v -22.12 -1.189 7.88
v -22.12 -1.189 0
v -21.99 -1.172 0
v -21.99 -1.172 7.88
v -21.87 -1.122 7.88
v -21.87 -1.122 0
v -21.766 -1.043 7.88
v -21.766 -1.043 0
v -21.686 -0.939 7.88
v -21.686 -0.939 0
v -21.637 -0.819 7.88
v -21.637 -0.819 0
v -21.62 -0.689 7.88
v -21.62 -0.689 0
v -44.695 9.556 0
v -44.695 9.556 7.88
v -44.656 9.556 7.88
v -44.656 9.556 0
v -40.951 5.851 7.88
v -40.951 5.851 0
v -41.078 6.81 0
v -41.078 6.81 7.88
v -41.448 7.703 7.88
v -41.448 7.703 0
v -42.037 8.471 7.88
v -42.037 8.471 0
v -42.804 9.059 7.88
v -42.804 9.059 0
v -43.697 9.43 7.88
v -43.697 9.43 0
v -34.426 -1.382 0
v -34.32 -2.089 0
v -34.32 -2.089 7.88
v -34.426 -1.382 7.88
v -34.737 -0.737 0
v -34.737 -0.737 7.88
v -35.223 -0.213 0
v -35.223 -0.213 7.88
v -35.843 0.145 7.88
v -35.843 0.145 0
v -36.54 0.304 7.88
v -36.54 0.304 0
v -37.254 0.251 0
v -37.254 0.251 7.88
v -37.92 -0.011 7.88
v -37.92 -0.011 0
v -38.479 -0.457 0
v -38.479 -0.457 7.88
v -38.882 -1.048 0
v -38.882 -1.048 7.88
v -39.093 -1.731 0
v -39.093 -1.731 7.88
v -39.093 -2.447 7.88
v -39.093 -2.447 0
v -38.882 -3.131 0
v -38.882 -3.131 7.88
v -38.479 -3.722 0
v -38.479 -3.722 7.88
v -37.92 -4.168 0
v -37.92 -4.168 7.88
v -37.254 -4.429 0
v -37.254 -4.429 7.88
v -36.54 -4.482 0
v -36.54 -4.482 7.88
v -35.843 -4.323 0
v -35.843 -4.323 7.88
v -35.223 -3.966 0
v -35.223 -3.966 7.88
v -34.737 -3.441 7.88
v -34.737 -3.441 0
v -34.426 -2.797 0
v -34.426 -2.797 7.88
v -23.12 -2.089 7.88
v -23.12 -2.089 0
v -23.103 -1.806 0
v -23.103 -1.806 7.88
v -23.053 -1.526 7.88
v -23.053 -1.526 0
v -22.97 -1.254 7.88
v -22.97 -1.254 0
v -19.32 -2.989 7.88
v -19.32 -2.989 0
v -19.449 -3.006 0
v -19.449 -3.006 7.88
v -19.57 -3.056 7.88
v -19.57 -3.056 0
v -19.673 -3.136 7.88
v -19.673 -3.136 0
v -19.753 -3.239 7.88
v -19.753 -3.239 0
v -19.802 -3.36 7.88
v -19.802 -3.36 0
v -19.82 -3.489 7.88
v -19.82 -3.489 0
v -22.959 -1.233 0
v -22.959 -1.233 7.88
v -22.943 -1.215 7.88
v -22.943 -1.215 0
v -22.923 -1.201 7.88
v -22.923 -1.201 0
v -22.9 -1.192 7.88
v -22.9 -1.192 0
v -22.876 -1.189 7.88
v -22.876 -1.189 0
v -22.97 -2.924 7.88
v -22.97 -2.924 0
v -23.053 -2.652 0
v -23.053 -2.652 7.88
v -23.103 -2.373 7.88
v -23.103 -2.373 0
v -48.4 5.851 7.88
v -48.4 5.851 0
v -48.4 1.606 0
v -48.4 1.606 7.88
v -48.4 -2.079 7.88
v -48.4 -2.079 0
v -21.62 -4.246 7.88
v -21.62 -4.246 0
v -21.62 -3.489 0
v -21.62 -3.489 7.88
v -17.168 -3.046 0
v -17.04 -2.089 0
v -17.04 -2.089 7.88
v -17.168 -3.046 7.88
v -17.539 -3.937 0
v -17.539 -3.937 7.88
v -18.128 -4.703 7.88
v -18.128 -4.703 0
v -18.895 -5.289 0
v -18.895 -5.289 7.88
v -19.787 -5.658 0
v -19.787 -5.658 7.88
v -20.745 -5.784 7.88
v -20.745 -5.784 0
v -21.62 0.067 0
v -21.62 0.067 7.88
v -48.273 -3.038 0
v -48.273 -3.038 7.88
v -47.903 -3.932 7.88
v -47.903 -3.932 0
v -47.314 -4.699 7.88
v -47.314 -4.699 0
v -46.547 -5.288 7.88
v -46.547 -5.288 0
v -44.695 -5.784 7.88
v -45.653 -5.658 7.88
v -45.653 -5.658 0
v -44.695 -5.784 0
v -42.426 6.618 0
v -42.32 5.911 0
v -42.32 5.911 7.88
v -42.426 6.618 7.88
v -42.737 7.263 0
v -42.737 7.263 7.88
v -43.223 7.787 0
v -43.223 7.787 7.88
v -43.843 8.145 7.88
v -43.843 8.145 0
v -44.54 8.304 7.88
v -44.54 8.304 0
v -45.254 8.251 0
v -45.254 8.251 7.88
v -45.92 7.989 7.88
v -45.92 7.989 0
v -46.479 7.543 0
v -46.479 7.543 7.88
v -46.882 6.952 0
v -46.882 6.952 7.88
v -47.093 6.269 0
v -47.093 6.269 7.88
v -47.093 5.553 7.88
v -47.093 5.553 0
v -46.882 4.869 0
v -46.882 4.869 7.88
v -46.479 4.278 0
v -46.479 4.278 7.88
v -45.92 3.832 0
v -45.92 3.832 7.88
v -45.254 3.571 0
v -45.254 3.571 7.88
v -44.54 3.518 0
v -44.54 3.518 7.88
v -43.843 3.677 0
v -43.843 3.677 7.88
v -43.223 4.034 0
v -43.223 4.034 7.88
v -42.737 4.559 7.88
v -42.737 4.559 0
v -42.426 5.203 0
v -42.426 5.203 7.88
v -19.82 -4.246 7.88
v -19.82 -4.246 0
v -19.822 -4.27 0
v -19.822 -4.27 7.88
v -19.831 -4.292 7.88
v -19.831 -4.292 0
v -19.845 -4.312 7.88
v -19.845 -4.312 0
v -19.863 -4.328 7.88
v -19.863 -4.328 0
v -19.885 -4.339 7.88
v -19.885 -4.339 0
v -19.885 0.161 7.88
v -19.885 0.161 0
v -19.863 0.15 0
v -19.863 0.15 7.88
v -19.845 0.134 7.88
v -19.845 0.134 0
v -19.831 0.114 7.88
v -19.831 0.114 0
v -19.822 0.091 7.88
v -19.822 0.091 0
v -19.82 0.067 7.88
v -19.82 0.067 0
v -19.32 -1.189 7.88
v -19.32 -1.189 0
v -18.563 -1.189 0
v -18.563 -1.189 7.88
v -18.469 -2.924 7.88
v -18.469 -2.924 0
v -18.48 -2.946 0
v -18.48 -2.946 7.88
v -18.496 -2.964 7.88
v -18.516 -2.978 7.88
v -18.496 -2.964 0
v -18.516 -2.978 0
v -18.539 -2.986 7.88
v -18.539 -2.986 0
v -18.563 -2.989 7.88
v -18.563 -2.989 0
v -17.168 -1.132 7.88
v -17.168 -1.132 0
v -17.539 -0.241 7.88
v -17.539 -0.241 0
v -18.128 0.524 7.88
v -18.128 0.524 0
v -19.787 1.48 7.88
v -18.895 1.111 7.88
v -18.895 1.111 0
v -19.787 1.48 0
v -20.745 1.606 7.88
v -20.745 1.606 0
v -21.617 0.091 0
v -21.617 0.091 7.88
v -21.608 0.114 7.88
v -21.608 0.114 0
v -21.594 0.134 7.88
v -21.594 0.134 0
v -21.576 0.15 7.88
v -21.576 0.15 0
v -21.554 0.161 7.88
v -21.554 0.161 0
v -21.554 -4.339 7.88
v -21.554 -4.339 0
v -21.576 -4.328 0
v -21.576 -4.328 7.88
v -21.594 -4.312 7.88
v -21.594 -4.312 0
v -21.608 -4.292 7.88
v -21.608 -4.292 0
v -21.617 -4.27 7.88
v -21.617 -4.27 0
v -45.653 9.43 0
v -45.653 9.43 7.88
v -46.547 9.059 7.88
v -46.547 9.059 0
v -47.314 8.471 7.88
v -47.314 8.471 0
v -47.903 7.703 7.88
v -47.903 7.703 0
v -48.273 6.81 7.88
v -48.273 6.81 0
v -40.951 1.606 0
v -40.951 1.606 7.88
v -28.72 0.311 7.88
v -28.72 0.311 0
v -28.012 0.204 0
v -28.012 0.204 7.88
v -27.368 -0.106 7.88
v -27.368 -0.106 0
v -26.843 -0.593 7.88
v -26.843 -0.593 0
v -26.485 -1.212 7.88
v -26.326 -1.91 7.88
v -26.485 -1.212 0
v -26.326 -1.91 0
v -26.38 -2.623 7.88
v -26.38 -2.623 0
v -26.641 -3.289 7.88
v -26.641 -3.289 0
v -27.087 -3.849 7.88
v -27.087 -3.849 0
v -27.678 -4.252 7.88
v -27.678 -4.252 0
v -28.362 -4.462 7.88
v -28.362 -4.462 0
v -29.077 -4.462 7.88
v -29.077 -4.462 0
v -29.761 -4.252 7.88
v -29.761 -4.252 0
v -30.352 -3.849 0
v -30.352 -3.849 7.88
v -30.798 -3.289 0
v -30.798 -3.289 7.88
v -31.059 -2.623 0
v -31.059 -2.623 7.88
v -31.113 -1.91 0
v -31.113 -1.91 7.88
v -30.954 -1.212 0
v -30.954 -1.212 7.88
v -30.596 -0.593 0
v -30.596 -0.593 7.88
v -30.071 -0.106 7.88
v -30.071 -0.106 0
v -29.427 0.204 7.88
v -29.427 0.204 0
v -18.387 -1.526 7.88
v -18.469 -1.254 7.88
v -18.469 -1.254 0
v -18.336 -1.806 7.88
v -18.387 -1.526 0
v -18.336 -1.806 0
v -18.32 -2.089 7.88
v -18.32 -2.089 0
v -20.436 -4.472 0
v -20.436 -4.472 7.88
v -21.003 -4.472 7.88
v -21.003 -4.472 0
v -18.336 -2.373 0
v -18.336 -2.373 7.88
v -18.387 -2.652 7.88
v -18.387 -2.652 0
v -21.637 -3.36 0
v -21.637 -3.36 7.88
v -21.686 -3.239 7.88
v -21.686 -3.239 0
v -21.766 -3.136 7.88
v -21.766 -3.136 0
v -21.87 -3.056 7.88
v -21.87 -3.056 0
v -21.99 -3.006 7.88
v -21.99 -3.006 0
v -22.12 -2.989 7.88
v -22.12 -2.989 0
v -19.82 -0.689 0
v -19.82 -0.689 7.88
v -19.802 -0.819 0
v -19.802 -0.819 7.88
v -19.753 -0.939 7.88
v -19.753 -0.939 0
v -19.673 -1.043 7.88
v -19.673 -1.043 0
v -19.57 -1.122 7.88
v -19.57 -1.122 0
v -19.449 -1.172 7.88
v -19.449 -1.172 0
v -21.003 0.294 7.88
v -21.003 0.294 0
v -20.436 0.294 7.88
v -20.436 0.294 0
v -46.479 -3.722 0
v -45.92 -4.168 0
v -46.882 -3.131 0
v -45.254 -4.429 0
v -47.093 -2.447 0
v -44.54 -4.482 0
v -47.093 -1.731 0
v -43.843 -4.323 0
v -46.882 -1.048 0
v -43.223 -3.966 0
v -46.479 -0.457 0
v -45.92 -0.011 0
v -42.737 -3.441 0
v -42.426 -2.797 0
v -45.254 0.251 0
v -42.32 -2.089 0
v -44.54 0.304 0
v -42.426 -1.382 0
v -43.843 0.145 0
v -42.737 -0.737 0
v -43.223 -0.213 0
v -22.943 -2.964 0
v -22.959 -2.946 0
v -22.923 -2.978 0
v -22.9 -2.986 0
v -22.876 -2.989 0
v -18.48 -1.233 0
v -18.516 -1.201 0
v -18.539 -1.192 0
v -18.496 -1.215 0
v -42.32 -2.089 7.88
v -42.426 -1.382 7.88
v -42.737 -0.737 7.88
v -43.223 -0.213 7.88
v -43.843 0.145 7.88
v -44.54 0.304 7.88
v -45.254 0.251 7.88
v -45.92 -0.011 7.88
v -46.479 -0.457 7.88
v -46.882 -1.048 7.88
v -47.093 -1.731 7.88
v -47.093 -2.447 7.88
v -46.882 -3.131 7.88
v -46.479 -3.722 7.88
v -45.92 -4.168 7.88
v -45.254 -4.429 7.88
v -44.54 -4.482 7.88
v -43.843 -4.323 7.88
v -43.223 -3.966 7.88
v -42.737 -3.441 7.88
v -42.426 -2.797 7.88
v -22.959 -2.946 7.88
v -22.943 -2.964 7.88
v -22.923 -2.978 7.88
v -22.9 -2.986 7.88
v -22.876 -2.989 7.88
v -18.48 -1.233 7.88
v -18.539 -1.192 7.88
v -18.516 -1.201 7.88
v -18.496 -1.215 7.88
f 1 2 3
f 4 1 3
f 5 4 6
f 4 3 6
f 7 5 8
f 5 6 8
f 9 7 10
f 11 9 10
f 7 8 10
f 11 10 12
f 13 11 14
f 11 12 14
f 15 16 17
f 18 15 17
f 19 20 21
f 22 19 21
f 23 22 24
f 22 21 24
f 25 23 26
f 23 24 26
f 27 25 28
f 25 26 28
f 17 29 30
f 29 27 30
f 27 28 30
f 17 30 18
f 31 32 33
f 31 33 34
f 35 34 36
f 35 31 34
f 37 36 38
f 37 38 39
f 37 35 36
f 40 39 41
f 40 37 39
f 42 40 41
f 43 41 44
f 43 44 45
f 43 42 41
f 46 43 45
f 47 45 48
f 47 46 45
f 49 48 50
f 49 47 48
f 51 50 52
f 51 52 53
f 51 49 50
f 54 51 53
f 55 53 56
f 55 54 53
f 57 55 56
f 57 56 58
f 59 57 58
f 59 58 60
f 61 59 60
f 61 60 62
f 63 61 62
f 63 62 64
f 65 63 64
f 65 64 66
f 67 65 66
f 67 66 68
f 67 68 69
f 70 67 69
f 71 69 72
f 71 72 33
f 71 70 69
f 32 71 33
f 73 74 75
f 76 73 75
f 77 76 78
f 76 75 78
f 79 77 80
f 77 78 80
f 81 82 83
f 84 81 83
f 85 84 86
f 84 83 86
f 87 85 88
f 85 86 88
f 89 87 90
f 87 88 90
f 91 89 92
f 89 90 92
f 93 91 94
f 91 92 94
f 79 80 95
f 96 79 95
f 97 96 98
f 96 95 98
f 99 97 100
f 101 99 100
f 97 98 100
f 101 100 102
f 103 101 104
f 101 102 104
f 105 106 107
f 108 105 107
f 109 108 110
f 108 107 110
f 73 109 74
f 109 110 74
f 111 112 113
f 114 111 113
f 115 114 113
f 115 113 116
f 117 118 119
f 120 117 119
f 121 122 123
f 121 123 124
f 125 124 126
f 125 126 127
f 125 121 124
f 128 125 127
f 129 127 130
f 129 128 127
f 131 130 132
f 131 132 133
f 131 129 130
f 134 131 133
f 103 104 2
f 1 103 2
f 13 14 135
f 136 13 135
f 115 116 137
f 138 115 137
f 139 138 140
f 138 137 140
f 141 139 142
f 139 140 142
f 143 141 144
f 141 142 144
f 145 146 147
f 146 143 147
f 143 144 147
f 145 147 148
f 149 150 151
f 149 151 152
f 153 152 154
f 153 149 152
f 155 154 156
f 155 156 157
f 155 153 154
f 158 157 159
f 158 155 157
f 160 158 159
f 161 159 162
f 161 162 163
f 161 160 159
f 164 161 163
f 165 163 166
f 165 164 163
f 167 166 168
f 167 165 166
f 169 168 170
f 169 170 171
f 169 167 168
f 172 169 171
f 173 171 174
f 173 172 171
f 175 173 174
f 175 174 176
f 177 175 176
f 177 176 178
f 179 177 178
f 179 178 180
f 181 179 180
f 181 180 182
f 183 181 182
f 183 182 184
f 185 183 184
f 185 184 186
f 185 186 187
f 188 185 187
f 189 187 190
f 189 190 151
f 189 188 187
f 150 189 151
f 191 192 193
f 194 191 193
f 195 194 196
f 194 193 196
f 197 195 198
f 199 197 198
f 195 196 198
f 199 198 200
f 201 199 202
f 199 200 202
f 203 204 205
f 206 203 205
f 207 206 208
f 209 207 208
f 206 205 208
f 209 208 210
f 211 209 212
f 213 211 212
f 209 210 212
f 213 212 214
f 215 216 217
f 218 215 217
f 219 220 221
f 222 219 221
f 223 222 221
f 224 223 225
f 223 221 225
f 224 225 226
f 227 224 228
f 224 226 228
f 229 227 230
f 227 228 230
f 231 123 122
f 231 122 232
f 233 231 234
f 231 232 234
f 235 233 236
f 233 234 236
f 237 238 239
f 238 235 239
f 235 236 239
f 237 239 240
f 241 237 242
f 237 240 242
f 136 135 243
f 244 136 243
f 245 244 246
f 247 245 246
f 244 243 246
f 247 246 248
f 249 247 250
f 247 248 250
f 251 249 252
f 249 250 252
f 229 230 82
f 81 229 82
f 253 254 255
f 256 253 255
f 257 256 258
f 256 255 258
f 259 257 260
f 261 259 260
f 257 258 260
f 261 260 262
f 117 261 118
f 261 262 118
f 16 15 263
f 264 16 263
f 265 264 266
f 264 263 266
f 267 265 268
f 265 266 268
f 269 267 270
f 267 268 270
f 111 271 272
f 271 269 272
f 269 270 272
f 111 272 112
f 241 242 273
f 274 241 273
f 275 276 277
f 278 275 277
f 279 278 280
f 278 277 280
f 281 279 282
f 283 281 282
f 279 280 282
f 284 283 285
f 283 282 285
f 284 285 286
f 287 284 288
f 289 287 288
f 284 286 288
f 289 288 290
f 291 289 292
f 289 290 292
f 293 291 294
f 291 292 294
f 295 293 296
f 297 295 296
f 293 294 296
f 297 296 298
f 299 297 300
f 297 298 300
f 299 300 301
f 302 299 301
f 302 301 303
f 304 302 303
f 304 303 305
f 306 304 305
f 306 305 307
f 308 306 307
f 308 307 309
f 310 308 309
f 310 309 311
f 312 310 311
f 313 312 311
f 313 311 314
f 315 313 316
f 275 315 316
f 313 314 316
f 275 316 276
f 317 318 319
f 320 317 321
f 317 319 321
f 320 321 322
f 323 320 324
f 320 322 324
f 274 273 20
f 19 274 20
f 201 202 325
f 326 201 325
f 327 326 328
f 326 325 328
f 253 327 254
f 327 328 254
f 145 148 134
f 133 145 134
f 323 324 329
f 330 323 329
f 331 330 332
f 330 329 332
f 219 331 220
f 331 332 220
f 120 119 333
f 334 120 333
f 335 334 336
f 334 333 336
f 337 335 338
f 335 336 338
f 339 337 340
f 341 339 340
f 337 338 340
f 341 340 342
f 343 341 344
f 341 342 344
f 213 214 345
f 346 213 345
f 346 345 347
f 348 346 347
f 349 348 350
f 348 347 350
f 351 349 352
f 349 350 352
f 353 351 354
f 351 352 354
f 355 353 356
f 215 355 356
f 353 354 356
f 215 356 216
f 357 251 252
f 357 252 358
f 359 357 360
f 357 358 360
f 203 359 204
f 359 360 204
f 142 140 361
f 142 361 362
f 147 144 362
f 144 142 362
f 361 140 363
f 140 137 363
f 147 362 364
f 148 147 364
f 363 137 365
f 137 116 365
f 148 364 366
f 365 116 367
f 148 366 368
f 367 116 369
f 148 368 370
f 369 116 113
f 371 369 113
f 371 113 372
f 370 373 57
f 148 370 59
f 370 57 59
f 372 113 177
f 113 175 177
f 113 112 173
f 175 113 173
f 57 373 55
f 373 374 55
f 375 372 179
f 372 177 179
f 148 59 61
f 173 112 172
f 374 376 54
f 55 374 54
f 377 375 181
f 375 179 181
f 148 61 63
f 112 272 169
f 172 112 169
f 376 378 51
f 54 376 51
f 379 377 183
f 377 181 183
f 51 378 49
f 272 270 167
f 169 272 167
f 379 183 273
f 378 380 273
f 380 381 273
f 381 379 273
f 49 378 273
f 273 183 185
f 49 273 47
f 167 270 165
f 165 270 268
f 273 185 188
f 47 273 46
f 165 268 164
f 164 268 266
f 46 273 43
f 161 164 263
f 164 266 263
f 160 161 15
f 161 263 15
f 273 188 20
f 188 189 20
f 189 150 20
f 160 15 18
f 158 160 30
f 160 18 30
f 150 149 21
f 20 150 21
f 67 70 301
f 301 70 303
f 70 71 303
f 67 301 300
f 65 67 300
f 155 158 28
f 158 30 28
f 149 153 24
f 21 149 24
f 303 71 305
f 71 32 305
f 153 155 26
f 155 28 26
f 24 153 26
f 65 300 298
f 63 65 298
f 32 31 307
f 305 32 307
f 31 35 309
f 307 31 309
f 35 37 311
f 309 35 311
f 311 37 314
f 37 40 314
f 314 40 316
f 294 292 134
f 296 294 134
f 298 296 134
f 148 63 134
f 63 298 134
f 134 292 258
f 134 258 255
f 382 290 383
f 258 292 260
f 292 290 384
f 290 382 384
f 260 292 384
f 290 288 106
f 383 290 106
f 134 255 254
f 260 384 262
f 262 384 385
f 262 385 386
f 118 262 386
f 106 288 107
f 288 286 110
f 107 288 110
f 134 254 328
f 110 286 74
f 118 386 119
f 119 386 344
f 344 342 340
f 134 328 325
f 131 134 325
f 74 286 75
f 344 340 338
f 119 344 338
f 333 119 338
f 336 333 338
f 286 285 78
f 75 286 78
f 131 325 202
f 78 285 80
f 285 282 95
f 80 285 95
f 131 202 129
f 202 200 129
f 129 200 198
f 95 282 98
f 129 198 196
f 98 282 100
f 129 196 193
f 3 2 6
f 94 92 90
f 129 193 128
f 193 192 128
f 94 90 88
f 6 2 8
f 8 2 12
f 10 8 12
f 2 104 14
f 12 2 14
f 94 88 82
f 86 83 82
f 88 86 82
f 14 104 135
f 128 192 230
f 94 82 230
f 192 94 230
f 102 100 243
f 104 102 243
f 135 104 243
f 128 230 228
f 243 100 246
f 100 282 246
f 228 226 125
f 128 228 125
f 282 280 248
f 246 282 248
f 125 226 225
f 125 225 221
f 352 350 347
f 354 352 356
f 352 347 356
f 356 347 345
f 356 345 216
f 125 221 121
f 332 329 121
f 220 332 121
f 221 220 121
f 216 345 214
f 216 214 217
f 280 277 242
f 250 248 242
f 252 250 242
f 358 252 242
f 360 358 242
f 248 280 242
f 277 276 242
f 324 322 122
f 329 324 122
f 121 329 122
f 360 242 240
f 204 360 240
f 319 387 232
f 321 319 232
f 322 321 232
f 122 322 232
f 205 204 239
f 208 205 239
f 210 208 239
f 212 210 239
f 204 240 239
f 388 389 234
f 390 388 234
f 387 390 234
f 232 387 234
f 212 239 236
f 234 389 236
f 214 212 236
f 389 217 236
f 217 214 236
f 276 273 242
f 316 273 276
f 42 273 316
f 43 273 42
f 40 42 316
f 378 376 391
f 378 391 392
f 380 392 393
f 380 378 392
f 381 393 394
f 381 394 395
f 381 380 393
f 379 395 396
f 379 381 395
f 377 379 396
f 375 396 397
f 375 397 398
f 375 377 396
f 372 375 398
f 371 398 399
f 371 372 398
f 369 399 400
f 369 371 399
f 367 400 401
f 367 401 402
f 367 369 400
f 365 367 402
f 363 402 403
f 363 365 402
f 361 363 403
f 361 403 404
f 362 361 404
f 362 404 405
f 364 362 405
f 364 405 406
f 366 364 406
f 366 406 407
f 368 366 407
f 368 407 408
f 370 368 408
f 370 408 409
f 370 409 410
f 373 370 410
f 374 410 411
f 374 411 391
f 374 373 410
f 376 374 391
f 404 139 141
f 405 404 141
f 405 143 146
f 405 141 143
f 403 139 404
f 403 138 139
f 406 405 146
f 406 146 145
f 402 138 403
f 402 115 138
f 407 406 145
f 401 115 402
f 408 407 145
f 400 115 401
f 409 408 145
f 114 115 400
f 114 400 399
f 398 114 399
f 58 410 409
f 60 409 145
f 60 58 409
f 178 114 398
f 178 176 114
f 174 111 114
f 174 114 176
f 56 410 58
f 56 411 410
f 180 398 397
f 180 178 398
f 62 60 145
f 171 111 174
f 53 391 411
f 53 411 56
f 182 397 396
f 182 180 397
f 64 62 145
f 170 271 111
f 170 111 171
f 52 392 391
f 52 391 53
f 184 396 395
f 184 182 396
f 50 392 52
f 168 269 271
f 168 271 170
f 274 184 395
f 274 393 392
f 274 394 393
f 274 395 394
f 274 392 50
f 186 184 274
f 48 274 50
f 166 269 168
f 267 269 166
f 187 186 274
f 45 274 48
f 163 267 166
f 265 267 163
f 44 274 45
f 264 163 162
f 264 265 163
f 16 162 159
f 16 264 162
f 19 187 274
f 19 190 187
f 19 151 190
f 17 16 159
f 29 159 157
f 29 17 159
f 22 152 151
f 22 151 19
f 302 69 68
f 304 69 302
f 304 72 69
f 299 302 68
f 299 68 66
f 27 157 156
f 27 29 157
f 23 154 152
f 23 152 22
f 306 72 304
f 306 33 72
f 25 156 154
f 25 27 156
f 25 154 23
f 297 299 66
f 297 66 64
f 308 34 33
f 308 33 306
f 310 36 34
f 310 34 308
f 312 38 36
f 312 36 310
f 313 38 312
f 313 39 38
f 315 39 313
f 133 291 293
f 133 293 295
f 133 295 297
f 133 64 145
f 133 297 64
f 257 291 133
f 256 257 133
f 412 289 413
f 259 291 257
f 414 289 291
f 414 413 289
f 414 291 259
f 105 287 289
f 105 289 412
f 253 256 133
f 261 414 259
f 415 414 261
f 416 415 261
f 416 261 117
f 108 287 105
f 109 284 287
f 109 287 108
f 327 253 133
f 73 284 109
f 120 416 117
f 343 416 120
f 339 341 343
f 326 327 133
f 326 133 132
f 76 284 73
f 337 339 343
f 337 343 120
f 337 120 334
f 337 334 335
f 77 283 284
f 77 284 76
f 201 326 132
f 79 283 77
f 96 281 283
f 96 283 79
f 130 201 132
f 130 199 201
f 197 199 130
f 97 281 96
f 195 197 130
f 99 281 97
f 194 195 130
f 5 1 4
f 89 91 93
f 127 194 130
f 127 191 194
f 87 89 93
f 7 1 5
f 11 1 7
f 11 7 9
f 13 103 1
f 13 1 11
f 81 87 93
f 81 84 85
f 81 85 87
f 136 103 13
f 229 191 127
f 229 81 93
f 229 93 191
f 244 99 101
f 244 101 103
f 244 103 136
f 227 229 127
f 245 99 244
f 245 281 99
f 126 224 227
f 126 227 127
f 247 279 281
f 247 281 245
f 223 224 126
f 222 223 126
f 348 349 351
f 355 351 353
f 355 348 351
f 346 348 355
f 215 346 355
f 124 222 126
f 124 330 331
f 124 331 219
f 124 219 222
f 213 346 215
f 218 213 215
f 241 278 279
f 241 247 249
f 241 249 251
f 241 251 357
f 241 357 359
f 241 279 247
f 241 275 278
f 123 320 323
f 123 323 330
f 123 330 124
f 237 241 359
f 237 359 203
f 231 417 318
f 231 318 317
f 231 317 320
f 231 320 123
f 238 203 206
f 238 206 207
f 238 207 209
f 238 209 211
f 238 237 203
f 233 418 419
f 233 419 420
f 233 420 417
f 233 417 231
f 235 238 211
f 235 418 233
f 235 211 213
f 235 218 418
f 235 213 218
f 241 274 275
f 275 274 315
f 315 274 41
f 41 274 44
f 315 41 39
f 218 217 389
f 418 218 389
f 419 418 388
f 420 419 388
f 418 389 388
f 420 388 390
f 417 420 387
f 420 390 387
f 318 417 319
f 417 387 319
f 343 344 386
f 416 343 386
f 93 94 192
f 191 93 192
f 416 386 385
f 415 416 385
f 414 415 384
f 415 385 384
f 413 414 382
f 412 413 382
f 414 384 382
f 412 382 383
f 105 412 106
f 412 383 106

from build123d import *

# Parameters (mm, degrees)
F0_R        = 2.4
F0_W        = 7.4481110471
F0_H        = 7.95
F1_DEPTH    = 7.88
F2_T1_DEPTH = 26.405


# Not quite as in the source:
# - a fillet or chamfer that OpenCascade refuses, or shapes differently, is made with other operations: its cross-section is extruded or revolved along the edge and cut away or added


with BuildPart() as f1:
    # F0 (on Top) → F1 (new body)
    with BuildSketch(Plane.XY):
        Polygon((-17.0395083171, 1.6058013724), (-28.7195083171, 1.6058013724), (-40.95139727, 1.6058013724), (-48.3995083171, 1.6058013724), (-48.3995083171, -5.7841986276), (-31.3221290569, -5.7841986276), (-17.0395083171, -5.7841986276), align=None)
        with Locations((-44.7195083171, -2.0891986276)):
            Circle(F0_R, mode=Mode.SUBTRACT)
        with Locations((-36.7195083171, -2.0891986276)):
            Circle(F0_R, mode=Mode.SUBTRACT)
        with BuildLine():
            ThreePointArc((-28.7195083171, -4.4891986276), (-31.1195083171, -2.0891986276), (-28.7195083171, 0.3108013724))
            ThreePointArc((-28.7195083171, 0.3108013724), (-26.3195083171, -2.0891986276), (-28.7195083171, -4.4891986276))
        make_face(mode=Mode.SUBTRACT)
        with BuildLine():
            ThreePointArc((-22.1195083171, -1.1891986276), (-21.7659549265, -1.0427520182), (-21.6195083171, -0.6891986276))
            Line((-21.6195083171, -0.6891986276), (-21.6195083171, 0.0671872376))
            ThreePointArc((-21.6195083171, 0.0671872376), (-21.601600524, 0.1242912617), (-21.5542909257, 0.1609431448))
            ThreePointArc((-21.5542909257, 0.1609431448), (-20.7195083171, 0.3108013724), (-19.8847257084, 0.1609431448))
            ThreePointArc((-19.8847257084, 0.1609431448), (-19.8374161101, 0.1242912617), (-19.8195083171, 0.0671872376))
            Line((-19.8195083171, 0.0671872376), (-19.8195083171, -0.6891986276))
            ThreePointArc((-19.8195083171, -0.6891986276), (-19.6730617076, -1.0427520182), (-19.3195083171, -1.1891986276))
            Line((-19.3195083171, -1.1891986276), (-18.5631224518, -1.1891986276))
            ThreePointArc((-18.5631224518, -1.1891986276), (-18.5060184277, -1.2071064207), (-18.4693665446, -1.2544160189))
            ThreePointArc((-18.4693665446, -1.2544160189), (-18.3572699449, -1.6651351029), (-18.3195083171, -2.0891986276))
            ThreePointArc((-18.3195083171, -2.0891986276), (-18.3572699449, -2.5132621524), (-18.4693665446, -2.9239812363))
            ThreePointArc((-18.4693665446, -2.9239812363), (-18.5060184277, -2.9712908345), (-18.5631224518, -2.9891986276))
            Line((-18.5631224518, -2.9891986276), (-19.3195083171, -2.9891986276))
            ThreePointArc((-19.3195083171, -2.9891986276), (-19.6730617076, -3.135645237), (-19.8195083171, -3.4891986276))
            Line((-19.8195083171, -3.4891986276), (-19.8195083171, -4.2455844929))
            ThreePointArc((-19.8195083171, -4.2455844929), (-19.8374161101, -4.302688517), (-19.8847257084, -4.3393404001))
            ThreePointArc((-19.8847257084, -4.3393404001), (-20.7195083171, -4.4891986276), (-21.5542909257, -4.3393404001))
            ThreePointArc((-21.5542909257, -4.3393404001), (-21.601600524, -4.302688517), (-21.6195083171, -4.2455844929))
            Line((-21.6195083171, -4.2455844929), (-21.6195083171, -3.4891986276))
            ThreePointArc((-21.6195083171, -3.4891986276), (-21.7659549265, -3.135645237), (-22.1195083171, -2.9891986276))
            Line((-22.1195083171, -2.9891986276), (-22.8758941823, -2.9891986276))
            ThreePointArc((-22.8758941823, -2.9891986276), (-22.9329982064, -2.9712908345), (-22.9696500895, -2.9239812363))
            ThreePointArc((-22.9696500895, -2.9239812363), (-23.0817466892, -2.5132621524), (-23.1195083171, -2.0891986276))
            ThreePointArc((-23.1195083171, -2.0891986276), (-23.0817466892, -1.6651351029), (-22.9696500895, -1.2544160189))
            ThreePointArc((-22.9696500895, -1.2544160189), (-22.9329982064, -1.2071064207), (-22.8758941823, -1.1891986276))
            Line((-22.8758941823, -1.1891986276), (-22.1195083171, -1.1891986276))
        make_face(mode=Mode.SUBTRACT)
        with Locations((-44.6754527935, 5.5808013724)):
            Rectangle(F0_W, F0_H)
        with Locations((-44.7195083171, 5.9108013724)):
            Circle(F0_R, mode=Mode.SUBTRACT)
    extrude(amount=F1_DEPTH)

    # F2: fillet of radius 3.705 on 5 edges, made by hand

    # F2_s2 → F2_t1 (cut)
    with BuildSketch(Plane.XY.offset(-9.2625)):
        with BuildLine():
            ThreePointArc((-44.6945083171, 9.5558013724), (-47.3143389413, 8.4706319967), (-48.3995083171, 5.8508013724))
            Line((-48.3995083171, 5.8508013724), (-48.3995083171, 9.5558013724))
            Line((-48.3995083171, 9.5558013724), (-44.6945083171, 9.5558013724))
        make_face()
        with BuildLine():
            ThreePointArc((-40.95139727, 5.8508013724), (-42.0365666457, 8.4706319967), (-44.65639727, 9.5558013724))
            Line((-44.65639727, 9.5558013724), (-40.95139727, 9.5558013724))
            Line((-40.95139727, 9.5558013724), (-40.95139727, 5.8508013724))
        make_face()
        with BuildLine():
            ThreePointArc((-48.3995083171, -2.0791986276), (-47.3143389413, -4.6990292519), (-44.6945083171, -5.7841986276))
            Line((-44.6945083171, -5.7841986276), (-48.3995083171, -5.7841986276))
            Line((-48.3995083171, -5.7841986276), (-48.3995083171, -2.0791986276))
        make_face()
        with BuildLine():
            ThreePointArc((-17.0395083171, -2.0991986276), (-18.1246776928, 0.5206319967), (-20.7445083171, 1.6058013724))
            Line((-20.7445083171, 1.6058013724), (-17.0395083171, 1.6058013724))
            Line((-17.0395083171, 1.6058013724), (-17.0395083171, -2.0991986276))
        make_face()
        with BuildLine():
            ThreePointArc((-17.0395083171, -2.0791986276), (-18.1246776928, -4.6990292519), (-20.7445083171, -5.7841986276))
            Line((-20.7445083171, -5.7841986276), (-17.0395083171, -5.7841986276))
            Line((-17.0395083171, -5.7841986276), (-17.0395083171, -2.0791986276))
        make_face()
    extrude(amount=F2_T1_DEPTH, mode=Mode.SUBTRACT)


solid = f1.part
